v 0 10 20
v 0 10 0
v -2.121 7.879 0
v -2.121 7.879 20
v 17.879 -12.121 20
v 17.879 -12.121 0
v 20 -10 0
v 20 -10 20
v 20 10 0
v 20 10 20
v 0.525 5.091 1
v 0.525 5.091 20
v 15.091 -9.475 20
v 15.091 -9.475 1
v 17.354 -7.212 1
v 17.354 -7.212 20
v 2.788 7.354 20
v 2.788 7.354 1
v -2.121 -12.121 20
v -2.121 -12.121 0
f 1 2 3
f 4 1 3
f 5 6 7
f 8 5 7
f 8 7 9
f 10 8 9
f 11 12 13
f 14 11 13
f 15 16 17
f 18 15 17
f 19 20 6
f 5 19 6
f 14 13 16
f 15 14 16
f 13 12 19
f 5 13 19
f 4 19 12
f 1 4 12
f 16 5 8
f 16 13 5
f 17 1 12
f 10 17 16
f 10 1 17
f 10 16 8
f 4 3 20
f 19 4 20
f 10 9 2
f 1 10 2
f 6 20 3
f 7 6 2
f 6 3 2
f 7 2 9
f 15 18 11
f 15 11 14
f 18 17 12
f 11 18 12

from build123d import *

# Parameters (mm, degrees)
F1_DEPTH = 20
F3_DEPTH = 19


with BuildPart() as f1:
    # F0 (on Top) → F1 (new body)
    with BuildSketch(Plane.XY):
        Polygon((20, 10), (0, 10), (-2.12132, 7.87868), (-2.12132, -12.12132), (17.87868, -12.12132), (20, -10), align=None)
    extrude(amount=F1_DEPTH)

    # F2 (on face) → F3 (cut)
    with BuildSketch(Plane.XY.offset(20)):
        Polygon((2.787511, 7.353911), (1.65614, 6.22254), (8.93934, -1.06066), (16.22254, -8.34386), (17.353911, -7.212489), align=None)
        Polygon((8.93934, -1.06066), (1.65614, 6.22254), (0.524769, 5.091169), (15.091169, -9.475231), (16.22254, -8.34386), align=None)
    extrude(amount=-F3_DEPTH, mode=Mode.SUBTRACT)


solid = f1.part
